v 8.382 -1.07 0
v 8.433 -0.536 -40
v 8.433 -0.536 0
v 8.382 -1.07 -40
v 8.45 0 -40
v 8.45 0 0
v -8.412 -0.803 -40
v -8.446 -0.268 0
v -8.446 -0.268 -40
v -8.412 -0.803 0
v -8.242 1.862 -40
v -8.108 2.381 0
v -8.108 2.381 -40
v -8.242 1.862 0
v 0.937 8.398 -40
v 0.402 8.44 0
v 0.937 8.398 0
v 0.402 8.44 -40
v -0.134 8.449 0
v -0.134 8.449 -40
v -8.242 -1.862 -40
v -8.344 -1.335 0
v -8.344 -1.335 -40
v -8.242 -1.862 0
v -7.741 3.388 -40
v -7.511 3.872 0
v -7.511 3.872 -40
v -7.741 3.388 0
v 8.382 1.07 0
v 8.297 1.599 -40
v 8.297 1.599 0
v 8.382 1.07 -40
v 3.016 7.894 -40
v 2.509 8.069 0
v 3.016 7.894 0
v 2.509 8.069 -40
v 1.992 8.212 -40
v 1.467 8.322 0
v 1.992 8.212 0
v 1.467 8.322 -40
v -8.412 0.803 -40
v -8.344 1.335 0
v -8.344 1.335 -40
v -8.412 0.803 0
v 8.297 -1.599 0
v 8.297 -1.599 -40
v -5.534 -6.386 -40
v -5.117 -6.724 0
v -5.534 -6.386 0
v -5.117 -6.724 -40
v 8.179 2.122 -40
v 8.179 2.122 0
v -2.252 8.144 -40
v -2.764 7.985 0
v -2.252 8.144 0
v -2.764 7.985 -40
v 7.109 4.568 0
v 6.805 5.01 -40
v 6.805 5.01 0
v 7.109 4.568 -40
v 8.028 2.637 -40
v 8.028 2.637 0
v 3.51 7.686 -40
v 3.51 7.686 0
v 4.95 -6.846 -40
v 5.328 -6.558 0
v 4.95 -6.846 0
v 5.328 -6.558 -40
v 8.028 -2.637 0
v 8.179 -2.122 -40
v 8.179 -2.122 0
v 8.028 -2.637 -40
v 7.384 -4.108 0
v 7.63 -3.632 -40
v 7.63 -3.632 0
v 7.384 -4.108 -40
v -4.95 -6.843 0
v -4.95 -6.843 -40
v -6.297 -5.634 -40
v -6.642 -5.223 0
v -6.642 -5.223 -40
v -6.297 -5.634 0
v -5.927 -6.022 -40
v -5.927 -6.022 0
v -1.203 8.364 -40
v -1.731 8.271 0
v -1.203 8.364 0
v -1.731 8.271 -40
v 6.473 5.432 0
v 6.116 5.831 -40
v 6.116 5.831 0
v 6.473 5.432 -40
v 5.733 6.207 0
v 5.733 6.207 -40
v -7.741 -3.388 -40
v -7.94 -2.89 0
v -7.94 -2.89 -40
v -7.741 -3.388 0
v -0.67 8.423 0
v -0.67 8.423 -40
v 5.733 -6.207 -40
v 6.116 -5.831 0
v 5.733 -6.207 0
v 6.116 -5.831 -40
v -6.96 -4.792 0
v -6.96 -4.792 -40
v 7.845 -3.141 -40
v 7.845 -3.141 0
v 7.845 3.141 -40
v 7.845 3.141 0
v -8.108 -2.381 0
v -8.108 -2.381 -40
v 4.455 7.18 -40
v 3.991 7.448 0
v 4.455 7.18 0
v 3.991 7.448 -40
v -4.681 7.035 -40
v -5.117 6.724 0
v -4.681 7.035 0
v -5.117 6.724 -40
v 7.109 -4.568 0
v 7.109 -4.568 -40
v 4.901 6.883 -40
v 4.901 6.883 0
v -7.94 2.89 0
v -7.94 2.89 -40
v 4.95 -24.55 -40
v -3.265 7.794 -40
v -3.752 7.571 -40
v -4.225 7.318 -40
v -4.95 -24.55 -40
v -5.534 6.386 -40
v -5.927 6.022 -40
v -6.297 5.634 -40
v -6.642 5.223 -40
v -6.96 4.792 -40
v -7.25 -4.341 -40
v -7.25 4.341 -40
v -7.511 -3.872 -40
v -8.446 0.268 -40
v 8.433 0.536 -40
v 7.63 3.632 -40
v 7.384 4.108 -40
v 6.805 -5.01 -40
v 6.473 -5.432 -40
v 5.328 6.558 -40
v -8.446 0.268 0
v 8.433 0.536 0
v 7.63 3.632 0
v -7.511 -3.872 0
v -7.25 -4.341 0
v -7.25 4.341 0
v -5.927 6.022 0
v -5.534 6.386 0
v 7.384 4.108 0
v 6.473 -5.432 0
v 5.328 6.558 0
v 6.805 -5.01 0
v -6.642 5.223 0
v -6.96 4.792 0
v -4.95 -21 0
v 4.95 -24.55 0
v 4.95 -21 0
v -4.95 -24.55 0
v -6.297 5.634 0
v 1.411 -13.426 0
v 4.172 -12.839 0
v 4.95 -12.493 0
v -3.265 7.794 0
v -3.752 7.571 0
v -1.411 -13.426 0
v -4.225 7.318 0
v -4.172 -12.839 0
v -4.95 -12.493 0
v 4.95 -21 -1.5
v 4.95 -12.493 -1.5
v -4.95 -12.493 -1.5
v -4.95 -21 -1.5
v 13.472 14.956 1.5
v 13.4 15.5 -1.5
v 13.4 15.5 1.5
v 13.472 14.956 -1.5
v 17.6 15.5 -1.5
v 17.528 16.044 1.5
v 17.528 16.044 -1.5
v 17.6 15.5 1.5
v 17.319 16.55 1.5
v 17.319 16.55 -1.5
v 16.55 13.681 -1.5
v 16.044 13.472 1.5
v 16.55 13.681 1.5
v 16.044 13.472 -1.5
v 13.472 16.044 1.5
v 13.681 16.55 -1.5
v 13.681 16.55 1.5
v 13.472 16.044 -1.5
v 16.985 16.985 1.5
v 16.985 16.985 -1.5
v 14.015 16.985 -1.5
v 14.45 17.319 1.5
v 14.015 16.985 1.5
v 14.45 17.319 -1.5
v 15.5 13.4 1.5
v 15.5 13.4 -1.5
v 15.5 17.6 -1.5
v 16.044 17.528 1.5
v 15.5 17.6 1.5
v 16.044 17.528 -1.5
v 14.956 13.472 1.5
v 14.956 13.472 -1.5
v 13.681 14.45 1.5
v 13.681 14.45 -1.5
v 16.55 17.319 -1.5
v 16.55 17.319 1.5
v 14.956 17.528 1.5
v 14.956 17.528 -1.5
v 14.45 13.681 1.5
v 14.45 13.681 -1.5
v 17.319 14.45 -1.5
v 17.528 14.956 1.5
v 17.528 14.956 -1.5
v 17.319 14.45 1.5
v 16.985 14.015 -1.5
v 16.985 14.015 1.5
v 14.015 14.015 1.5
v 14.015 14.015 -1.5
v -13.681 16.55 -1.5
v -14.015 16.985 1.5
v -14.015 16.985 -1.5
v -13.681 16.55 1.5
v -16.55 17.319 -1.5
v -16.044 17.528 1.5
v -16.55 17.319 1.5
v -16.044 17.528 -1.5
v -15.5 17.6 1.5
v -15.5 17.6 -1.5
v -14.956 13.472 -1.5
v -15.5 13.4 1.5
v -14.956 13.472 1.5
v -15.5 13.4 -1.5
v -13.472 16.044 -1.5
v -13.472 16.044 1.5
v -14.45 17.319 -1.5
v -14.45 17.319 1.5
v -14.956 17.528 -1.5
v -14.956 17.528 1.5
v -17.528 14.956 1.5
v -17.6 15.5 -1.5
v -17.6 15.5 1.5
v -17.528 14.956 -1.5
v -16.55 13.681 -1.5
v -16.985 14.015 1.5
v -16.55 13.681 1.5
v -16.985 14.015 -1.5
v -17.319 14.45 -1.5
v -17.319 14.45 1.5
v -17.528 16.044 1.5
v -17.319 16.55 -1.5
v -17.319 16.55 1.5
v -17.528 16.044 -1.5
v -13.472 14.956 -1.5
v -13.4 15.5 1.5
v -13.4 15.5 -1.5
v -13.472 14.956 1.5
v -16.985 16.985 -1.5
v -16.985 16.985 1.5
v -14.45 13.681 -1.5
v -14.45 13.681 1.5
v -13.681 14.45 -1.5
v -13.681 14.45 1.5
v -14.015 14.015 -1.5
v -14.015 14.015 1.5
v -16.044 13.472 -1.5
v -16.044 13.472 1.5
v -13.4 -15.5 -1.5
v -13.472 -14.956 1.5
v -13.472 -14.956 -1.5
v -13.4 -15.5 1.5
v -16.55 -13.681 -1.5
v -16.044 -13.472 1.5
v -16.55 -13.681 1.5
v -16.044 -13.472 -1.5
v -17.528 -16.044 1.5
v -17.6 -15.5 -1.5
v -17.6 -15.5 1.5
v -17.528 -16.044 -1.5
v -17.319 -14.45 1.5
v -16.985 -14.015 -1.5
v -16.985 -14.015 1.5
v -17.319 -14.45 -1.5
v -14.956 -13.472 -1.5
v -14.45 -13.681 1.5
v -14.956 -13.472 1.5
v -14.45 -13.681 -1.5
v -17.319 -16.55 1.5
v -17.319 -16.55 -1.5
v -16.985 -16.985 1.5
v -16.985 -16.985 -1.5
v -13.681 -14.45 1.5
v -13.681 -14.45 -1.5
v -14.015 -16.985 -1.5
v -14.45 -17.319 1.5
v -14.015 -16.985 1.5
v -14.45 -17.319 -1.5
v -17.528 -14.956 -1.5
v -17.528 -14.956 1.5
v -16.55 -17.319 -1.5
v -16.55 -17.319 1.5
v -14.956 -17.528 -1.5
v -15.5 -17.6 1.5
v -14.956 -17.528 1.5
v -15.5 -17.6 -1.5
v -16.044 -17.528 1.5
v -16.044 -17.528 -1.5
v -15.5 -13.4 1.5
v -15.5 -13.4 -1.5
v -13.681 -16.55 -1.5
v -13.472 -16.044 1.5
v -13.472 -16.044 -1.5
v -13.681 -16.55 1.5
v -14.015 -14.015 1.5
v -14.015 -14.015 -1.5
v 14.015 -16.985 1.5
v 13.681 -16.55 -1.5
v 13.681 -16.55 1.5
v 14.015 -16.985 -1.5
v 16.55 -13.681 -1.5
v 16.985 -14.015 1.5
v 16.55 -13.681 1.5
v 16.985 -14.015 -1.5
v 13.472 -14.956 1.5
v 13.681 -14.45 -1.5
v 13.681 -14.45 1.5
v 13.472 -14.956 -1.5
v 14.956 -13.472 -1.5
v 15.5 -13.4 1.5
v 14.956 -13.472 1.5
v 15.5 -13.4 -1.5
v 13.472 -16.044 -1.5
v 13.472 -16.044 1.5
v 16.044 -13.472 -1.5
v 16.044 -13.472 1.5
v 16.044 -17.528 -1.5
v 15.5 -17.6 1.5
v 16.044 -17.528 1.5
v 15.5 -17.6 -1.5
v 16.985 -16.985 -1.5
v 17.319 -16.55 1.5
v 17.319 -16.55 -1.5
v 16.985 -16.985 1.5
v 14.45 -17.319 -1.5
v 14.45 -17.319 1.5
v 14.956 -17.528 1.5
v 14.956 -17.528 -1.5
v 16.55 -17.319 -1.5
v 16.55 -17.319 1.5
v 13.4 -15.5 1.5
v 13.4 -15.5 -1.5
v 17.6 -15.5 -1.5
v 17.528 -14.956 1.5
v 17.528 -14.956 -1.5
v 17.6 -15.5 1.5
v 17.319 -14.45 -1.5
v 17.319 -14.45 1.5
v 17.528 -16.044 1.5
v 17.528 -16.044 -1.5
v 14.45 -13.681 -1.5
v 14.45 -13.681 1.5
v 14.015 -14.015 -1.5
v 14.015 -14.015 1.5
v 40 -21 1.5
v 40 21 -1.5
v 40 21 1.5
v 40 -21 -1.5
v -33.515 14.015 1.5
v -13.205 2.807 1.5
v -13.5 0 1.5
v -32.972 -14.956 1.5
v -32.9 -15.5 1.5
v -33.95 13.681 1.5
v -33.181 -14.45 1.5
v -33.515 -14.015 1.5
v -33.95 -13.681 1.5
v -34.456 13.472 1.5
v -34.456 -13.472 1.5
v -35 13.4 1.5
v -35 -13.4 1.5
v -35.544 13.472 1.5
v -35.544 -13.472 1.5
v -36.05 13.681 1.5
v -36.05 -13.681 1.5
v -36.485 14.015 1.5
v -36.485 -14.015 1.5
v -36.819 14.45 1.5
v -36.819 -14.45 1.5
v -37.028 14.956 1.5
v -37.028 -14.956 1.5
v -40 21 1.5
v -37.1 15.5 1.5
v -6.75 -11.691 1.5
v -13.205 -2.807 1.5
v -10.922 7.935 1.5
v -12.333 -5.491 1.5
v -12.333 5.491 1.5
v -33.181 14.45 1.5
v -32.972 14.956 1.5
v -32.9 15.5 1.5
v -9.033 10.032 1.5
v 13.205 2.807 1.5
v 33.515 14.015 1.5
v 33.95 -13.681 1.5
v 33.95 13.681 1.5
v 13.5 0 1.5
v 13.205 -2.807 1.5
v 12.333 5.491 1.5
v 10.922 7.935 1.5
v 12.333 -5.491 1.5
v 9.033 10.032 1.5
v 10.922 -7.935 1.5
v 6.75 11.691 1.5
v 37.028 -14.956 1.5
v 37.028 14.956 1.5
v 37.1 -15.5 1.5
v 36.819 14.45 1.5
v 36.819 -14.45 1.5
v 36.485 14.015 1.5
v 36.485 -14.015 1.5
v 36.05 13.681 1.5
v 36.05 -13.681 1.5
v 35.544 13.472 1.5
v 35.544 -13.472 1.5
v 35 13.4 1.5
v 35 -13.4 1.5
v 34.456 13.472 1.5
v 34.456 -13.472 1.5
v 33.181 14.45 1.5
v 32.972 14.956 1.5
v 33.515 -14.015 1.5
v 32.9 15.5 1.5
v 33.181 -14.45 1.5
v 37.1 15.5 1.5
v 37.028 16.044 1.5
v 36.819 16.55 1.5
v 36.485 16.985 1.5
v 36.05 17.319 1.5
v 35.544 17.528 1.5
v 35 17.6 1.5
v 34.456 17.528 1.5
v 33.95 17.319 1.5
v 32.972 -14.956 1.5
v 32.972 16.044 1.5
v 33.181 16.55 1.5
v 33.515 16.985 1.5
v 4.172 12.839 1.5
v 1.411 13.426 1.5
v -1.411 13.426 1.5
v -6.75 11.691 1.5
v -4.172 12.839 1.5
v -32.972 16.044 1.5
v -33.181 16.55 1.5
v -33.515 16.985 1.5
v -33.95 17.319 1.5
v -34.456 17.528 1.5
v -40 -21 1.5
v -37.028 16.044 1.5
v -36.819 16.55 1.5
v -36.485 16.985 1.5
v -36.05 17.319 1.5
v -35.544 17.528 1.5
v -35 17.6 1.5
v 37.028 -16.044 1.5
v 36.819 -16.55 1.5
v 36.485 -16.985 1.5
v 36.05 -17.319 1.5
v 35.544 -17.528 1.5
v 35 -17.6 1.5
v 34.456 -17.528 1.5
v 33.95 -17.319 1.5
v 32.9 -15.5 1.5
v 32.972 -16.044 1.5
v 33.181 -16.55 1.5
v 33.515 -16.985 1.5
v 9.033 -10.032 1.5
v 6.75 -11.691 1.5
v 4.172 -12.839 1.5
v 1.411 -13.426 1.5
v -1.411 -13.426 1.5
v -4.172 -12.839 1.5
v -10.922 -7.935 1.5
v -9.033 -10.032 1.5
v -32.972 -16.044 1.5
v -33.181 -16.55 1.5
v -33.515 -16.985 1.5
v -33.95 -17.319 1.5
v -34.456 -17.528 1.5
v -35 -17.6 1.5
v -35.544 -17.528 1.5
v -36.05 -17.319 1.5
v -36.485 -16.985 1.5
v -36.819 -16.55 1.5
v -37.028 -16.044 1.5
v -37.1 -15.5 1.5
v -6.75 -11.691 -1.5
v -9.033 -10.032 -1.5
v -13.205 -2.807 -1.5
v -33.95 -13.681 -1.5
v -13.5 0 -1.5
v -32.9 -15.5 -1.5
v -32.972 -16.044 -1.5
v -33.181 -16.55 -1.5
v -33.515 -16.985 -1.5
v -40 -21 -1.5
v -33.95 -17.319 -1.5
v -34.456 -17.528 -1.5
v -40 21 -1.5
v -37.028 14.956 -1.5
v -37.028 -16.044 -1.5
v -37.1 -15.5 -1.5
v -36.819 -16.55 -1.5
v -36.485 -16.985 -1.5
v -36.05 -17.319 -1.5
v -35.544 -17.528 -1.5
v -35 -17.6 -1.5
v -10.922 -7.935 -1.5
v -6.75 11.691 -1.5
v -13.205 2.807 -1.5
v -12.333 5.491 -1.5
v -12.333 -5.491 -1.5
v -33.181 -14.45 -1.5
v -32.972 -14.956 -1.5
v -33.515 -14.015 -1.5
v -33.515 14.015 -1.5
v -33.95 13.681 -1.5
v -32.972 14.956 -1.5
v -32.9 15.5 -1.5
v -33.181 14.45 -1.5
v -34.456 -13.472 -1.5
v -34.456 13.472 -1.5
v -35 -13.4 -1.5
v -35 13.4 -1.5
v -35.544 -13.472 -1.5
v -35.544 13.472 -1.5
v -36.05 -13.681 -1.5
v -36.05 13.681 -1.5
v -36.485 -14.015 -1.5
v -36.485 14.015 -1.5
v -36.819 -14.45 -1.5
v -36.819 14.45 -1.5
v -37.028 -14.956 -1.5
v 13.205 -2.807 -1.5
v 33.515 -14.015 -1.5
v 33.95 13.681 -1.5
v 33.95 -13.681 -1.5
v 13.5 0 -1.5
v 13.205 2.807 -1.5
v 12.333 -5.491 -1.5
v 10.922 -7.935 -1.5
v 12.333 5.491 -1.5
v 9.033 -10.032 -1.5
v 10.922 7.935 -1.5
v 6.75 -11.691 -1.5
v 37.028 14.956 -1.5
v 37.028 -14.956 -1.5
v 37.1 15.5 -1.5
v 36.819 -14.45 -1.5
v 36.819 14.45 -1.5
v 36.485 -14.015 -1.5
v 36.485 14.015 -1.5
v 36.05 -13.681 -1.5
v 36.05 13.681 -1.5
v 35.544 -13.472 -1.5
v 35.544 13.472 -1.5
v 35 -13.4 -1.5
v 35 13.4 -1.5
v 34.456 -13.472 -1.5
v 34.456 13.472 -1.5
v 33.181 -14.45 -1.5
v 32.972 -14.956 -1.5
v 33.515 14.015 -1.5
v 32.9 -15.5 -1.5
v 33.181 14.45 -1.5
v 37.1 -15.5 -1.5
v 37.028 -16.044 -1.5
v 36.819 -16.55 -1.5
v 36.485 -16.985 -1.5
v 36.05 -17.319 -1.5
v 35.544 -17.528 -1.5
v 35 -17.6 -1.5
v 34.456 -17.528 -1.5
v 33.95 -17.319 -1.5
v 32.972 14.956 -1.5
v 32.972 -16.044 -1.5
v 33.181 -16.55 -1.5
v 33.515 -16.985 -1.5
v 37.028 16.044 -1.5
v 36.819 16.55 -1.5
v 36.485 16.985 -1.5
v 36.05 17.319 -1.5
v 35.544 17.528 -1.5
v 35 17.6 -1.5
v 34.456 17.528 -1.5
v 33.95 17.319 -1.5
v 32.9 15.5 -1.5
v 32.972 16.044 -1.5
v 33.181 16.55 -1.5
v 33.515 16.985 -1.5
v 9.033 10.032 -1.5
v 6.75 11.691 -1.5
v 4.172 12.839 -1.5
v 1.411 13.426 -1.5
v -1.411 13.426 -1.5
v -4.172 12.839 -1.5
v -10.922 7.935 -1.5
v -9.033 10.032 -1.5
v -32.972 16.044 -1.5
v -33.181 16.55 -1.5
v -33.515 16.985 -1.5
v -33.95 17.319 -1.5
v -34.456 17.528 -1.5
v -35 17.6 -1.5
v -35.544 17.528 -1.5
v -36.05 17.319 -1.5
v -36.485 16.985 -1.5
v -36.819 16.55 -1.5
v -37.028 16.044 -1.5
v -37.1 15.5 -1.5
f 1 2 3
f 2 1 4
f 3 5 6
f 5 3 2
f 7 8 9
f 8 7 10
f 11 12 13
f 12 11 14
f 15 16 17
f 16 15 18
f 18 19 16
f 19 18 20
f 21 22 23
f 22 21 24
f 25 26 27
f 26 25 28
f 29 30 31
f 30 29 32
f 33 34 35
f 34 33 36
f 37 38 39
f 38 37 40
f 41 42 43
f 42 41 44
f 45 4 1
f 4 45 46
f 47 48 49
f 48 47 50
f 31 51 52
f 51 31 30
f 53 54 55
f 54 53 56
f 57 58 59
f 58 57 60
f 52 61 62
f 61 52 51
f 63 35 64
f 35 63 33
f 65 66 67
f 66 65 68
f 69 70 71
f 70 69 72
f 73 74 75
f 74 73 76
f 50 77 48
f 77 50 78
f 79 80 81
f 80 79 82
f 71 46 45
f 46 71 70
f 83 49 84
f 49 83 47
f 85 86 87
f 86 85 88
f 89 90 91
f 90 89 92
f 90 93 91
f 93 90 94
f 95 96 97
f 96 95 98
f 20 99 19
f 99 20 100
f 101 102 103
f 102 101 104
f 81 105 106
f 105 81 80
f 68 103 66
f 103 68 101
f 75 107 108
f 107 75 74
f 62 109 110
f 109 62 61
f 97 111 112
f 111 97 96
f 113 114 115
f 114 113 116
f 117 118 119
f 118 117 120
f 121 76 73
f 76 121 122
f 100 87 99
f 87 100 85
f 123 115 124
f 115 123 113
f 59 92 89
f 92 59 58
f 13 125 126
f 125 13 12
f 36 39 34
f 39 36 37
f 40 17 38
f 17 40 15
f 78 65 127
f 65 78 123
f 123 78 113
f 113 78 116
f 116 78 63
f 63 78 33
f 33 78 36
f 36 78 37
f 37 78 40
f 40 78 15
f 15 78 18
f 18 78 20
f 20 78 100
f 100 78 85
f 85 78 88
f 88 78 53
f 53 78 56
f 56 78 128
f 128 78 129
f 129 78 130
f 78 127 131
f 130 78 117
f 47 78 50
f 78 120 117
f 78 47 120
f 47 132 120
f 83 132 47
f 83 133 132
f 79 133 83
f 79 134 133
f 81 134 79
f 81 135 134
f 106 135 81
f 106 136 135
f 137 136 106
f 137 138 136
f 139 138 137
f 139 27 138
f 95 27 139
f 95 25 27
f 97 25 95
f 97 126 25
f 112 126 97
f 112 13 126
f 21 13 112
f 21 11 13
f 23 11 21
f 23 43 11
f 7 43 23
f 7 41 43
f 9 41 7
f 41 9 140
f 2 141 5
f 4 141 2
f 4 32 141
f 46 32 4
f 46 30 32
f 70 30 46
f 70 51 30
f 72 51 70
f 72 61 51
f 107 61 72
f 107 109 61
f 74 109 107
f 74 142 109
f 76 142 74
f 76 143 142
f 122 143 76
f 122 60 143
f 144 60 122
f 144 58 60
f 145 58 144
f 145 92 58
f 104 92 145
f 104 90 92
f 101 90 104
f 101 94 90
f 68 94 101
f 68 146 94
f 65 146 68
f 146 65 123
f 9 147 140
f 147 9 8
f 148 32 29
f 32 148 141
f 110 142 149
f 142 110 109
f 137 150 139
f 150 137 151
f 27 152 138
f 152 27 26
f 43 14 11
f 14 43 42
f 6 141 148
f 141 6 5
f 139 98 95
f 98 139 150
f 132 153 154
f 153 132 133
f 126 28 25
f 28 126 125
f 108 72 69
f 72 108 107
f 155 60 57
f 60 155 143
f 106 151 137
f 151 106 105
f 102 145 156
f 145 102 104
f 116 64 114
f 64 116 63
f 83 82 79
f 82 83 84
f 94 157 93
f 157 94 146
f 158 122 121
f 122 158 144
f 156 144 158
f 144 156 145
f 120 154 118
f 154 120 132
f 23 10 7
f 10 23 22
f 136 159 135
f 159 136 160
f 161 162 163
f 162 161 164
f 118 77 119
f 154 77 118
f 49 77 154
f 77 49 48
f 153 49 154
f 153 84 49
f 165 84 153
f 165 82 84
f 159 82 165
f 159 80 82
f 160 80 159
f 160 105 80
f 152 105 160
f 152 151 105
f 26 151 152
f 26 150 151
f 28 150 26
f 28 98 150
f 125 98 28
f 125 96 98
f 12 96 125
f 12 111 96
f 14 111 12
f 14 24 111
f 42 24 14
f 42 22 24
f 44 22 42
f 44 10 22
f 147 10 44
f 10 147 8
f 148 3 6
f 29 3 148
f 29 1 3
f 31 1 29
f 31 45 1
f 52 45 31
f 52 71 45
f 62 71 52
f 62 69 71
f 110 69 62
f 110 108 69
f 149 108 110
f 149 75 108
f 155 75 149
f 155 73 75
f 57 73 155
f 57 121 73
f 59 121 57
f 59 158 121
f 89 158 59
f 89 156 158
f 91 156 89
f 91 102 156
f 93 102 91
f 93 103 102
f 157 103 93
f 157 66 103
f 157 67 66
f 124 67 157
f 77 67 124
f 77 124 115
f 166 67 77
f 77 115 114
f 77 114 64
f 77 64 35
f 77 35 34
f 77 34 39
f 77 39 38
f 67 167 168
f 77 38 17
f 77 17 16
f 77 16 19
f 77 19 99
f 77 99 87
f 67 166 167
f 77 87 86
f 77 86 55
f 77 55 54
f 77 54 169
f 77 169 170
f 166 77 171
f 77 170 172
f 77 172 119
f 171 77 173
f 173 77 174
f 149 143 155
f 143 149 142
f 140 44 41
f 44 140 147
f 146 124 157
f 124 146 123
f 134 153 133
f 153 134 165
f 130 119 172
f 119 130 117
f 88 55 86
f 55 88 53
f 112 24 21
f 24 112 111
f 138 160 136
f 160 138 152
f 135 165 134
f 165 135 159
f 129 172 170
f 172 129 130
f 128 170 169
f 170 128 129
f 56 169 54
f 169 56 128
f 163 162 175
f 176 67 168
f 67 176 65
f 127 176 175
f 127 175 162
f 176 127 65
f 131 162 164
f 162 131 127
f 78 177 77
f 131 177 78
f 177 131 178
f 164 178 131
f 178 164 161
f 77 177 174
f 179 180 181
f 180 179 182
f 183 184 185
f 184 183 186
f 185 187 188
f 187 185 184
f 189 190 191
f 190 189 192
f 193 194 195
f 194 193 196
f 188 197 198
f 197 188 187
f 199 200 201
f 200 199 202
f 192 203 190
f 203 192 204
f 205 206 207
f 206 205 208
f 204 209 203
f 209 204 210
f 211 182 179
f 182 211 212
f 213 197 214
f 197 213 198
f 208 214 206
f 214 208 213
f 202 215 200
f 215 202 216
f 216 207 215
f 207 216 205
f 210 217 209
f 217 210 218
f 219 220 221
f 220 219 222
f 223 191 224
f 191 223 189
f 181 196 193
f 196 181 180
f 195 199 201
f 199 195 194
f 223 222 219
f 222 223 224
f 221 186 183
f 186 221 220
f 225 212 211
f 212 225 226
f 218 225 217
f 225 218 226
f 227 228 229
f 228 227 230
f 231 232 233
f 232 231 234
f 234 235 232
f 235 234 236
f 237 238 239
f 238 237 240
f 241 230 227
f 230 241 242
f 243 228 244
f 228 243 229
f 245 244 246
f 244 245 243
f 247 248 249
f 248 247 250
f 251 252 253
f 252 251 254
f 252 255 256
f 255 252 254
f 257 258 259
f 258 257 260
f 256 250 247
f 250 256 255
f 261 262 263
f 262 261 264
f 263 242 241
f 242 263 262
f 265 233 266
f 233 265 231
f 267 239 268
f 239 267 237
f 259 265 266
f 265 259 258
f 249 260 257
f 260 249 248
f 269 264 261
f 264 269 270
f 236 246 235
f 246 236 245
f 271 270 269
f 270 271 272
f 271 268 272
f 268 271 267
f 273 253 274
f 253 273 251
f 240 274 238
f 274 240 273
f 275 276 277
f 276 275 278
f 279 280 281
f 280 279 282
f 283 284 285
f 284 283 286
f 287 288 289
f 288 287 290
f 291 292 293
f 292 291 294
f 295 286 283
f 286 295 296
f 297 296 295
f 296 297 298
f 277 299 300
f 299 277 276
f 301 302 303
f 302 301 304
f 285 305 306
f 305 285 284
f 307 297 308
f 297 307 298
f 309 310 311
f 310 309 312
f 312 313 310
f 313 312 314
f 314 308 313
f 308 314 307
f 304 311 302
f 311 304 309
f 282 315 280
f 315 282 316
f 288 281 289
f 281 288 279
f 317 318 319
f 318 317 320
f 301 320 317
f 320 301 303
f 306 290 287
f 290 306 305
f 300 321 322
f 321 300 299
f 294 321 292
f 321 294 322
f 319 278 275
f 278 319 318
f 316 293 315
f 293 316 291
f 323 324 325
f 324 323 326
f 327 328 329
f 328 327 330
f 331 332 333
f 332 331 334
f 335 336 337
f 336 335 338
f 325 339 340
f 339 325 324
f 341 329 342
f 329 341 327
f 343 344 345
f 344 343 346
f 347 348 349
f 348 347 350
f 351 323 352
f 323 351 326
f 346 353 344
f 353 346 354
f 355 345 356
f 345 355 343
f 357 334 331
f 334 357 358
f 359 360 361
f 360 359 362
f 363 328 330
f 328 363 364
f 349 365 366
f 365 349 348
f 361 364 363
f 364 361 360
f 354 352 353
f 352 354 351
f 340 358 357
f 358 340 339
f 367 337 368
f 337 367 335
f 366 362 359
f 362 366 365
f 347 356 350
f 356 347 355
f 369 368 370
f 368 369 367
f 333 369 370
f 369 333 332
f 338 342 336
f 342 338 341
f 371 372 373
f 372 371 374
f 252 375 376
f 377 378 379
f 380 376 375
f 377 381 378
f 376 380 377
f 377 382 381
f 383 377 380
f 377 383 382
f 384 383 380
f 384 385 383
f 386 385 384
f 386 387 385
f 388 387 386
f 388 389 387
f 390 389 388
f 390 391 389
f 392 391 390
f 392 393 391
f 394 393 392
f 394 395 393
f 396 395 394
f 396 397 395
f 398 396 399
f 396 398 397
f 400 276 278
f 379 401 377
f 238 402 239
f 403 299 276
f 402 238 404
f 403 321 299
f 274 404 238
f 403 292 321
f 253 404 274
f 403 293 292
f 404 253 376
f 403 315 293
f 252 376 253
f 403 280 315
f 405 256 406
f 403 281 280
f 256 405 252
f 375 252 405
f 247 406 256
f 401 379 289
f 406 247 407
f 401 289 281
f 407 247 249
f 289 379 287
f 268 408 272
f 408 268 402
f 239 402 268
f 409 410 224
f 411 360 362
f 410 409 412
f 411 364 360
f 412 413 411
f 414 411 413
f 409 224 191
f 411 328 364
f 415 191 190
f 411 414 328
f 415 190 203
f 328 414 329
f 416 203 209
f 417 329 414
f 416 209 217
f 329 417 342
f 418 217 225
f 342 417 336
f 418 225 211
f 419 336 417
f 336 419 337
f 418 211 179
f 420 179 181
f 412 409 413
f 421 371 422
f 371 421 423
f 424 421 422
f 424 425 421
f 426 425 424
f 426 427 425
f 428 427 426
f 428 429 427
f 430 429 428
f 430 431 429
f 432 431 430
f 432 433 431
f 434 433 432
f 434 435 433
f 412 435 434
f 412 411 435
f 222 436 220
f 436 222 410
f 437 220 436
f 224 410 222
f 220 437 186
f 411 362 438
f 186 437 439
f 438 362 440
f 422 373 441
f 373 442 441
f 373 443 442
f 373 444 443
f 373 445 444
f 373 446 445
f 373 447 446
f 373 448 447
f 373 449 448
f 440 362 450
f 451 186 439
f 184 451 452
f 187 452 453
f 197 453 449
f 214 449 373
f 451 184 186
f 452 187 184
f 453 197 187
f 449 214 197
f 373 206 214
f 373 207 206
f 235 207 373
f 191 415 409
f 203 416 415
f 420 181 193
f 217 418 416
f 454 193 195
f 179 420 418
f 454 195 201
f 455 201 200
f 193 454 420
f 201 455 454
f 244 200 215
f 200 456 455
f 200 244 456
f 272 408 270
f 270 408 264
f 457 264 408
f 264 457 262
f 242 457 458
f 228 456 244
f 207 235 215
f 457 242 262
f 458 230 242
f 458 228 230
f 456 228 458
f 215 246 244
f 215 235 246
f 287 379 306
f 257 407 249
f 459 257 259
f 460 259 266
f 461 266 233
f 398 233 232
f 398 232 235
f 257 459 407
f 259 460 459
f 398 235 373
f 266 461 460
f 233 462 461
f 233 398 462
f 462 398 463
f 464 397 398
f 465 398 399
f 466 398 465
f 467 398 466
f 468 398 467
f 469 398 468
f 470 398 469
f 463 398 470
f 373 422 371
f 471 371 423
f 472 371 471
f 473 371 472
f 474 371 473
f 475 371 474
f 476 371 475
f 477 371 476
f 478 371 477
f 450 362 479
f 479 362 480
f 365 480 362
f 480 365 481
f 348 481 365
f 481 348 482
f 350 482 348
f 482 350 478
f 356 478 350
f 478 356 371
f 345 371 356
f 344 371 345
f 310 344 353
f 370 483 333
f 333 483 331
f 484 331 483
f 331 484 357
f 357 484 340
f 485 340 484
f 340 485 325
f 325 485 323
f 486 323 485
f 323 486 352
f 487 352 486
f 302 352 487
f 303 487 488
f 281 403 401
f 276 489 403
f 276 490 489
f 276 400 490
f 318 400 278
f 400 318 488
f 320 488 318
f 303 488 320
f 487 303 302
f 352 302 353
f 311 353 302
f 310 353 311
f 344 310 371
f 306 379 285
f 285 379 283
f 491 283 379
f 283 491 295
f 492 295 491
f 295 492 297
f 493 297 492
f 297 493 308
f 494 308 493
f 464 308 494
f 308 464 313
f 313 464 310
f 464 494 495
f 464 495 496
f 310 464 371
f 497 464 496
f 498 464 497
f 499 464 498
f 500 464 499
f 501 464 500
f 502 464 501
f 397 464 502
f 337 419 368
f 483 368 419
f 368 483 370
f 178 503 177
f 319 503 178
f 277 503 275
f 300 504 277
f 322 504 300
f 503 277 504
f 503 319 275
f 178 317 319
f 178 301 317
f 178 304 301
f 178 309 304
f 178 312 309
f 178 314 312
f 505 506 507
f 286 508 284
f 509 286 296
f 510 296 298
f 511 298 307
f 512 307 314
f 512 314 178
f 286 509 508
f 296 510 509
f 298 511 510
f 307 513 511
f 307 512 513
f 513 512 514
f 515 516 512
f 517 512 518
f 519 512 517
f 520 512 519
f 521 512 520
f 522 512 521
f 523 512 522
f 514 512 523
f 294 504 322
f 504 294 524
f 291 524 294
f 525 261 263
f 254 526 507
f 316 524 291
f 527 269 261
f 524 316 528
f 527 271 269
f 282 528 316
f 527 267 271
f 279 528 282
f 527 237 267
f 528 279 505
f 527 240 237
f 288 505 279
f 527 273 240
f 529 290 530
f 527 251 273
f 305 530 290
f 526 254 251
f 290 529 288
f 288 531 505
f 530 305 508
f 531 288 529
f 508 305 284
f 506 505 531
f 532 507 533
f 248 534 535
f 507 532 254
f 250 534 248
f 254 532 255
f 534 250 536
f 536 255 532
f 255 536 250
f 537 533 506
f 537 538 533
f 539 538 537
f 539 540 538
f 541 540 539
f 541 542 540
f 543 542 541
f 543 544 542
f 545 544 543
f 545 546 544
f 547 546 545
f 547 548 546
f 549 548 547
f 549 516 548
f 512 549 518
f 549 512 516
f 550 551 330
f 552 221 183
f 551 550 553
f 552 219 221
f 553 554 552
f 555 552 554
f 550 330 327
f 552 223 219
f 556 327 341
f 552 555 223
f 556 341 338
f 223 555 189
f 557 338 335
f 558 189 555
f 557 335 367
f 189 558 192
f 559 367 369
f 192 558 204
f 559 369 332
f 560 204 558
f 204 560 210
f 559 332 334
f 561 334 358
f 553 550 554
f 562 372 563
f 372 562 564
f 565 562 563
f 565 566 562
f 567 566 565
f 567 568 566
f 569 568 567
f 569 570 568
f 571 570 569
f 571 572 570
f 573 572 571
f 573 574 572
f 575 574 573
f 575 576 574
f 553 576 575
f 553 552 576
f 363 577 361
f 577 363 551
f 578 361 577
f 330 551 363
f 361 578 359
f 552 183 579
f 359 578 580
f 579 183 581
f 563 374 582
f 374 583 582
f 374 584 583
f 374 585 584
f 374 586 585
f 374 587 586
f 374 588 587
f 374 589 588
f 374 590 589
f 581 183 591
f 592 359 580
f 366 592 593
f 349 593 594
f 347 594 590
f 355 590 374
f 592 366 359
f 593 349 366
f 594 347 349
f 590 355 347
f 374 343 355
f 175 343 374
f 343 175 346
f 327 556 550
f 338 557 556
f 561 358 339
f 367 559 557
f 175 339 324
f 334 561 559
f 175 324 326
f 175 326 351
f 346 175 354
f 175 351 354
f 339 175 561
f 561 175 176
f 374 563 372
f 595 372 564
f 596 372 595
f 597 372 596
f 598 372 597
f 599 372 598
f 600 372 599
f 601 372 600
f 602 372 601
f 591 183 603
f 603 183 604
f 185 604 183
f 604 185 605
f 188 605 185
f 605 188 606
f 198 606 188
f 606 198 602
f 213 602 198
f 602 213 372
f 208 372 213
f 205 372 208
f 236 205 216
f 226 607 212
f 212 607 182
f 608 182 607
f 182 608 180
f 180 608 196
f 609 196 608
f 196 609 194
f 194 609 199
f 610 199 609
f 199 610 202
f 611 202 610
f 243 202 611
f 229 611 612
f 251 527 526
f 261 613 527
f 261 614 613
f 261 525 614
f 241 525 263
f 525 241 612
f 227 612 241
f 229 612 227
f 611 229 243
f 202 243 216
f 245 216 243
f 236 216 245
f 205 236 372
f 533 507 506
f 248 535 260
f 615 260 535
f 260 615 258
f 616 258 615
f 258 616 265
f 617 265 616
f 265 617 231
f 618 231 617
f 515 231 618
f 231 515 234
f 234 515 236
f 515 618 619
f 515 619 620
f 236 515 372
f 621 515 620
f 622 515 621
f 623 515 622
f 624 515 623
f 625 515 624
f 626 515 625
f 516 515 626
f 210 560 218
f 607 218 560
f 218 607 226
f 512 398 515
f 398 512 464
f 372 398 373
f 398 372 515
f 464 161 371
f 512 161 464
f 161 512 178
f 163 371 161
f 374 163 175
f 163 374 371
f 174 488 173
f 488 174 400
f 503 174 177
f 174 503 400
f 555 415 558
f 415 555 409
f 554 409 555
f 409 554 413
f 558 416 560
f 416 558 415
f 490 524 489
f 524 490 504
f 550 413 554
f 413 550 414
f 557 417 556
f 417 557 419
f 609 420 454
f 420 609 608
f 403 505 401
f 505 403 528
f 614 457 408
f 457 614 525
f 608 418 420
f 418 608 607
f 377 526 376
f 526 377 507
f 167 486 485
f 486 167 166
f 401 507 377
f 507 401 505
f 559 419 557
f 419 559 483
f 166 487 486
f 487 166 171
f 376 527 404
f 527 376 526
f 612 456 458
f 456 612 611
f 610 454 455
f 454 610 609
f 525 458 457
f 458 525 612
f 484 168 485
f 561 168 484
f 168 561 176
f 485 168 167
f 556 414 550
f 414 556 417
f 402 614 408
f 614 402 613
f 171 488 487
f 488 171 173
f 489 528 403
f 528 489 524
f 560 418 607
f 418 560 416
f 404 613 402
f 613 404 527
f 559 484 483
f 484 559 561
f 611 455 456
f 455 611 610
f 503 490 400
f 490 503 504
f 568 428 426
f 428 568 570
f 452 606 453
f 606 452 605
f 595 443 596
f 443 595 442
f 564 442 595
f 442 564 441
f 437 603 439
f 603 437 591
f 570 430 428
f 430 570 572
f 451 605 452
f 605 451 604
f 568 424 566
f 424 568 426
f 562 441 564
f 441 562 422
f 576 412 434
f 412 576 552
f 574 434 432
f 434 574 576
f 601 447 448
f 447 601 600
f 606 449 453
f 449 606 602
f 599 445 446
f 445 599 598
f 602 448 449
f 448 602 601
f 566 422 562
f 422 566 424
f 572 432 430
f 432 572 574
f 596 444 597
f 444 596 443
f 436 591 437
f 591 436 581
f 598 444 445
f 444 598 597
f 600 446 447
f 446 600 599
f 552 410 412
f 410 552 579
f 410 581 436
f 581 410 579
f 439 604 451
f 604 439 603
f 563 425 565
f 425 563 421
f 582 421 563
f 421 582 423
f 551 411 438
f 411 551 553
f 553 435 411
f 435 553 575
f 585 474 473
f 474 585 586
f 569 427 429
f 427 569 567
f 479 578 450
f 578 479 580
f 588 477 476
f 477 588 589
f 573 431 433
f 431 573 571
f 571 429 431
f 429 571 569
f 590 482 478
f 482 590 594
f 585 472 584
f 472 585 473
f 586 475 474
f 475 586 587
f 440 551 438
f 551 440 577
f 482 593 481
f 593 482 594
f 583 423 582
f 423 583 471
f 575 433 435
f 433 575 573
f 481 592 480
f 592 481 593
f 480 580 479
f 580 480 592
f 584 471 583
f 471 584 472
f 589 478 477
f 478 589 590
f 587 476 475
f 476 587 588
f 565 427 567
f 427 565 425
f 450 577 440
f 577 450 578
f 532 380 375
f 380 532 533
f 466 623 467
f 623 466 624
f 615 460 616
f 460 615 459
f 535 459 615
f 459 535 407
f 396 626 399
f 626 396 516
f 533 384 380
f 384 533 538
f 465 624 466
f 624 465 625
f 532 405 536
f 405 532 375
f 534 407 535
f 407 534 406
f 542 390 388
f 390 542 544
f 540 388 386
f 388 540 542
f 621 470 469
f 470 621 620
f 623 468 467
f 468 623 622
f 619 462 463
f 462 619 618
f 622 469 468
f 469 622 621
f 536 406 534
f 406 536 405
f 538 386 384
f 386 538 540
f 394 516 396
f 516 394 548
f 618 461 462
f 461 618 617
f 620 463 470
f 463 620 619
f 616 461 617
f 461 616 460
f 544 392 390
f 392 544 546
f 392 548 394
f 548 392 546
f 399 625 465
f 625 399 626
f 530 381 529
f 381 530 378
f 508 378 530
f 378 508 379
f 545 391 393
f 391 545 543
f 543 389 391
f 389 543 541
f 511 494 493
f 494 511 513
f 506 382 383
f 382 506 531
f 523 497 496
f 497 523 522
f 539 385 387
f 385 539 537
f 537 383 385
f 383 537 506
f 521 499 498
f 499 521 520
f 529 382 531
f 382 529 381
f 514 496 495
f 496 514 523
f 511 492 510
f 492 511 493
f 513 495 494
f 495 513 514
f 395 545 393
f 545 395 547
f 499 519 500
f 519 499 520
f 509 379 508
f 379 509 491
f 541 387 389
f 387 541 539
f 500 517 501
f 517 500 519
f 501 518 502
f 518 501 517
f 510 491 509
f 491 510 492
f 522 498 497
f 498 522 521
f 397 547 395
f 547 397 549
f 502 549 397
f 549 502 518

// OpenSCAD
module schliesszylinder() {
    union() {
        rotate([90, 0, 0]) cylinder(h=40, d=16.9, $fn=99);
        translate([-9.9/2, -40, 0]) {
            cube([9.9, 40, 33 -16.9/2 ]);
        }
    }
}


rotate([90,0, 0]) schliesszylinder();


difference() {
    cube([80, 42, 3], center=true);
    // NEMA 17 crews
    for(i=[0:3]){
        rotate([0, 0, 90*i]) {
            translate([15.5, 15.5, -10]) {
                cylinder(h=30, d=4.2, $fn=24);
            }
        }
    }
    // NEMA 17 plate
    cylinder(d=27, h=30, center=true);
    
    // crews to fit it to the MDF
    translate([70/2, 31/2, -10]) cylinder(h=30, d=4.2, $fn=24);
    translate([70/2, -31/2, -10]) cylinder(h=30, d=4.2, $fn=24);
    translate([-70/2, 31/2, -10]) cylinder(h=30, d=4.2, $fn=24);
    translate([-70/2, -31/2, -10]) cylinder(h=30, d=4.2, $fn=24);
}
